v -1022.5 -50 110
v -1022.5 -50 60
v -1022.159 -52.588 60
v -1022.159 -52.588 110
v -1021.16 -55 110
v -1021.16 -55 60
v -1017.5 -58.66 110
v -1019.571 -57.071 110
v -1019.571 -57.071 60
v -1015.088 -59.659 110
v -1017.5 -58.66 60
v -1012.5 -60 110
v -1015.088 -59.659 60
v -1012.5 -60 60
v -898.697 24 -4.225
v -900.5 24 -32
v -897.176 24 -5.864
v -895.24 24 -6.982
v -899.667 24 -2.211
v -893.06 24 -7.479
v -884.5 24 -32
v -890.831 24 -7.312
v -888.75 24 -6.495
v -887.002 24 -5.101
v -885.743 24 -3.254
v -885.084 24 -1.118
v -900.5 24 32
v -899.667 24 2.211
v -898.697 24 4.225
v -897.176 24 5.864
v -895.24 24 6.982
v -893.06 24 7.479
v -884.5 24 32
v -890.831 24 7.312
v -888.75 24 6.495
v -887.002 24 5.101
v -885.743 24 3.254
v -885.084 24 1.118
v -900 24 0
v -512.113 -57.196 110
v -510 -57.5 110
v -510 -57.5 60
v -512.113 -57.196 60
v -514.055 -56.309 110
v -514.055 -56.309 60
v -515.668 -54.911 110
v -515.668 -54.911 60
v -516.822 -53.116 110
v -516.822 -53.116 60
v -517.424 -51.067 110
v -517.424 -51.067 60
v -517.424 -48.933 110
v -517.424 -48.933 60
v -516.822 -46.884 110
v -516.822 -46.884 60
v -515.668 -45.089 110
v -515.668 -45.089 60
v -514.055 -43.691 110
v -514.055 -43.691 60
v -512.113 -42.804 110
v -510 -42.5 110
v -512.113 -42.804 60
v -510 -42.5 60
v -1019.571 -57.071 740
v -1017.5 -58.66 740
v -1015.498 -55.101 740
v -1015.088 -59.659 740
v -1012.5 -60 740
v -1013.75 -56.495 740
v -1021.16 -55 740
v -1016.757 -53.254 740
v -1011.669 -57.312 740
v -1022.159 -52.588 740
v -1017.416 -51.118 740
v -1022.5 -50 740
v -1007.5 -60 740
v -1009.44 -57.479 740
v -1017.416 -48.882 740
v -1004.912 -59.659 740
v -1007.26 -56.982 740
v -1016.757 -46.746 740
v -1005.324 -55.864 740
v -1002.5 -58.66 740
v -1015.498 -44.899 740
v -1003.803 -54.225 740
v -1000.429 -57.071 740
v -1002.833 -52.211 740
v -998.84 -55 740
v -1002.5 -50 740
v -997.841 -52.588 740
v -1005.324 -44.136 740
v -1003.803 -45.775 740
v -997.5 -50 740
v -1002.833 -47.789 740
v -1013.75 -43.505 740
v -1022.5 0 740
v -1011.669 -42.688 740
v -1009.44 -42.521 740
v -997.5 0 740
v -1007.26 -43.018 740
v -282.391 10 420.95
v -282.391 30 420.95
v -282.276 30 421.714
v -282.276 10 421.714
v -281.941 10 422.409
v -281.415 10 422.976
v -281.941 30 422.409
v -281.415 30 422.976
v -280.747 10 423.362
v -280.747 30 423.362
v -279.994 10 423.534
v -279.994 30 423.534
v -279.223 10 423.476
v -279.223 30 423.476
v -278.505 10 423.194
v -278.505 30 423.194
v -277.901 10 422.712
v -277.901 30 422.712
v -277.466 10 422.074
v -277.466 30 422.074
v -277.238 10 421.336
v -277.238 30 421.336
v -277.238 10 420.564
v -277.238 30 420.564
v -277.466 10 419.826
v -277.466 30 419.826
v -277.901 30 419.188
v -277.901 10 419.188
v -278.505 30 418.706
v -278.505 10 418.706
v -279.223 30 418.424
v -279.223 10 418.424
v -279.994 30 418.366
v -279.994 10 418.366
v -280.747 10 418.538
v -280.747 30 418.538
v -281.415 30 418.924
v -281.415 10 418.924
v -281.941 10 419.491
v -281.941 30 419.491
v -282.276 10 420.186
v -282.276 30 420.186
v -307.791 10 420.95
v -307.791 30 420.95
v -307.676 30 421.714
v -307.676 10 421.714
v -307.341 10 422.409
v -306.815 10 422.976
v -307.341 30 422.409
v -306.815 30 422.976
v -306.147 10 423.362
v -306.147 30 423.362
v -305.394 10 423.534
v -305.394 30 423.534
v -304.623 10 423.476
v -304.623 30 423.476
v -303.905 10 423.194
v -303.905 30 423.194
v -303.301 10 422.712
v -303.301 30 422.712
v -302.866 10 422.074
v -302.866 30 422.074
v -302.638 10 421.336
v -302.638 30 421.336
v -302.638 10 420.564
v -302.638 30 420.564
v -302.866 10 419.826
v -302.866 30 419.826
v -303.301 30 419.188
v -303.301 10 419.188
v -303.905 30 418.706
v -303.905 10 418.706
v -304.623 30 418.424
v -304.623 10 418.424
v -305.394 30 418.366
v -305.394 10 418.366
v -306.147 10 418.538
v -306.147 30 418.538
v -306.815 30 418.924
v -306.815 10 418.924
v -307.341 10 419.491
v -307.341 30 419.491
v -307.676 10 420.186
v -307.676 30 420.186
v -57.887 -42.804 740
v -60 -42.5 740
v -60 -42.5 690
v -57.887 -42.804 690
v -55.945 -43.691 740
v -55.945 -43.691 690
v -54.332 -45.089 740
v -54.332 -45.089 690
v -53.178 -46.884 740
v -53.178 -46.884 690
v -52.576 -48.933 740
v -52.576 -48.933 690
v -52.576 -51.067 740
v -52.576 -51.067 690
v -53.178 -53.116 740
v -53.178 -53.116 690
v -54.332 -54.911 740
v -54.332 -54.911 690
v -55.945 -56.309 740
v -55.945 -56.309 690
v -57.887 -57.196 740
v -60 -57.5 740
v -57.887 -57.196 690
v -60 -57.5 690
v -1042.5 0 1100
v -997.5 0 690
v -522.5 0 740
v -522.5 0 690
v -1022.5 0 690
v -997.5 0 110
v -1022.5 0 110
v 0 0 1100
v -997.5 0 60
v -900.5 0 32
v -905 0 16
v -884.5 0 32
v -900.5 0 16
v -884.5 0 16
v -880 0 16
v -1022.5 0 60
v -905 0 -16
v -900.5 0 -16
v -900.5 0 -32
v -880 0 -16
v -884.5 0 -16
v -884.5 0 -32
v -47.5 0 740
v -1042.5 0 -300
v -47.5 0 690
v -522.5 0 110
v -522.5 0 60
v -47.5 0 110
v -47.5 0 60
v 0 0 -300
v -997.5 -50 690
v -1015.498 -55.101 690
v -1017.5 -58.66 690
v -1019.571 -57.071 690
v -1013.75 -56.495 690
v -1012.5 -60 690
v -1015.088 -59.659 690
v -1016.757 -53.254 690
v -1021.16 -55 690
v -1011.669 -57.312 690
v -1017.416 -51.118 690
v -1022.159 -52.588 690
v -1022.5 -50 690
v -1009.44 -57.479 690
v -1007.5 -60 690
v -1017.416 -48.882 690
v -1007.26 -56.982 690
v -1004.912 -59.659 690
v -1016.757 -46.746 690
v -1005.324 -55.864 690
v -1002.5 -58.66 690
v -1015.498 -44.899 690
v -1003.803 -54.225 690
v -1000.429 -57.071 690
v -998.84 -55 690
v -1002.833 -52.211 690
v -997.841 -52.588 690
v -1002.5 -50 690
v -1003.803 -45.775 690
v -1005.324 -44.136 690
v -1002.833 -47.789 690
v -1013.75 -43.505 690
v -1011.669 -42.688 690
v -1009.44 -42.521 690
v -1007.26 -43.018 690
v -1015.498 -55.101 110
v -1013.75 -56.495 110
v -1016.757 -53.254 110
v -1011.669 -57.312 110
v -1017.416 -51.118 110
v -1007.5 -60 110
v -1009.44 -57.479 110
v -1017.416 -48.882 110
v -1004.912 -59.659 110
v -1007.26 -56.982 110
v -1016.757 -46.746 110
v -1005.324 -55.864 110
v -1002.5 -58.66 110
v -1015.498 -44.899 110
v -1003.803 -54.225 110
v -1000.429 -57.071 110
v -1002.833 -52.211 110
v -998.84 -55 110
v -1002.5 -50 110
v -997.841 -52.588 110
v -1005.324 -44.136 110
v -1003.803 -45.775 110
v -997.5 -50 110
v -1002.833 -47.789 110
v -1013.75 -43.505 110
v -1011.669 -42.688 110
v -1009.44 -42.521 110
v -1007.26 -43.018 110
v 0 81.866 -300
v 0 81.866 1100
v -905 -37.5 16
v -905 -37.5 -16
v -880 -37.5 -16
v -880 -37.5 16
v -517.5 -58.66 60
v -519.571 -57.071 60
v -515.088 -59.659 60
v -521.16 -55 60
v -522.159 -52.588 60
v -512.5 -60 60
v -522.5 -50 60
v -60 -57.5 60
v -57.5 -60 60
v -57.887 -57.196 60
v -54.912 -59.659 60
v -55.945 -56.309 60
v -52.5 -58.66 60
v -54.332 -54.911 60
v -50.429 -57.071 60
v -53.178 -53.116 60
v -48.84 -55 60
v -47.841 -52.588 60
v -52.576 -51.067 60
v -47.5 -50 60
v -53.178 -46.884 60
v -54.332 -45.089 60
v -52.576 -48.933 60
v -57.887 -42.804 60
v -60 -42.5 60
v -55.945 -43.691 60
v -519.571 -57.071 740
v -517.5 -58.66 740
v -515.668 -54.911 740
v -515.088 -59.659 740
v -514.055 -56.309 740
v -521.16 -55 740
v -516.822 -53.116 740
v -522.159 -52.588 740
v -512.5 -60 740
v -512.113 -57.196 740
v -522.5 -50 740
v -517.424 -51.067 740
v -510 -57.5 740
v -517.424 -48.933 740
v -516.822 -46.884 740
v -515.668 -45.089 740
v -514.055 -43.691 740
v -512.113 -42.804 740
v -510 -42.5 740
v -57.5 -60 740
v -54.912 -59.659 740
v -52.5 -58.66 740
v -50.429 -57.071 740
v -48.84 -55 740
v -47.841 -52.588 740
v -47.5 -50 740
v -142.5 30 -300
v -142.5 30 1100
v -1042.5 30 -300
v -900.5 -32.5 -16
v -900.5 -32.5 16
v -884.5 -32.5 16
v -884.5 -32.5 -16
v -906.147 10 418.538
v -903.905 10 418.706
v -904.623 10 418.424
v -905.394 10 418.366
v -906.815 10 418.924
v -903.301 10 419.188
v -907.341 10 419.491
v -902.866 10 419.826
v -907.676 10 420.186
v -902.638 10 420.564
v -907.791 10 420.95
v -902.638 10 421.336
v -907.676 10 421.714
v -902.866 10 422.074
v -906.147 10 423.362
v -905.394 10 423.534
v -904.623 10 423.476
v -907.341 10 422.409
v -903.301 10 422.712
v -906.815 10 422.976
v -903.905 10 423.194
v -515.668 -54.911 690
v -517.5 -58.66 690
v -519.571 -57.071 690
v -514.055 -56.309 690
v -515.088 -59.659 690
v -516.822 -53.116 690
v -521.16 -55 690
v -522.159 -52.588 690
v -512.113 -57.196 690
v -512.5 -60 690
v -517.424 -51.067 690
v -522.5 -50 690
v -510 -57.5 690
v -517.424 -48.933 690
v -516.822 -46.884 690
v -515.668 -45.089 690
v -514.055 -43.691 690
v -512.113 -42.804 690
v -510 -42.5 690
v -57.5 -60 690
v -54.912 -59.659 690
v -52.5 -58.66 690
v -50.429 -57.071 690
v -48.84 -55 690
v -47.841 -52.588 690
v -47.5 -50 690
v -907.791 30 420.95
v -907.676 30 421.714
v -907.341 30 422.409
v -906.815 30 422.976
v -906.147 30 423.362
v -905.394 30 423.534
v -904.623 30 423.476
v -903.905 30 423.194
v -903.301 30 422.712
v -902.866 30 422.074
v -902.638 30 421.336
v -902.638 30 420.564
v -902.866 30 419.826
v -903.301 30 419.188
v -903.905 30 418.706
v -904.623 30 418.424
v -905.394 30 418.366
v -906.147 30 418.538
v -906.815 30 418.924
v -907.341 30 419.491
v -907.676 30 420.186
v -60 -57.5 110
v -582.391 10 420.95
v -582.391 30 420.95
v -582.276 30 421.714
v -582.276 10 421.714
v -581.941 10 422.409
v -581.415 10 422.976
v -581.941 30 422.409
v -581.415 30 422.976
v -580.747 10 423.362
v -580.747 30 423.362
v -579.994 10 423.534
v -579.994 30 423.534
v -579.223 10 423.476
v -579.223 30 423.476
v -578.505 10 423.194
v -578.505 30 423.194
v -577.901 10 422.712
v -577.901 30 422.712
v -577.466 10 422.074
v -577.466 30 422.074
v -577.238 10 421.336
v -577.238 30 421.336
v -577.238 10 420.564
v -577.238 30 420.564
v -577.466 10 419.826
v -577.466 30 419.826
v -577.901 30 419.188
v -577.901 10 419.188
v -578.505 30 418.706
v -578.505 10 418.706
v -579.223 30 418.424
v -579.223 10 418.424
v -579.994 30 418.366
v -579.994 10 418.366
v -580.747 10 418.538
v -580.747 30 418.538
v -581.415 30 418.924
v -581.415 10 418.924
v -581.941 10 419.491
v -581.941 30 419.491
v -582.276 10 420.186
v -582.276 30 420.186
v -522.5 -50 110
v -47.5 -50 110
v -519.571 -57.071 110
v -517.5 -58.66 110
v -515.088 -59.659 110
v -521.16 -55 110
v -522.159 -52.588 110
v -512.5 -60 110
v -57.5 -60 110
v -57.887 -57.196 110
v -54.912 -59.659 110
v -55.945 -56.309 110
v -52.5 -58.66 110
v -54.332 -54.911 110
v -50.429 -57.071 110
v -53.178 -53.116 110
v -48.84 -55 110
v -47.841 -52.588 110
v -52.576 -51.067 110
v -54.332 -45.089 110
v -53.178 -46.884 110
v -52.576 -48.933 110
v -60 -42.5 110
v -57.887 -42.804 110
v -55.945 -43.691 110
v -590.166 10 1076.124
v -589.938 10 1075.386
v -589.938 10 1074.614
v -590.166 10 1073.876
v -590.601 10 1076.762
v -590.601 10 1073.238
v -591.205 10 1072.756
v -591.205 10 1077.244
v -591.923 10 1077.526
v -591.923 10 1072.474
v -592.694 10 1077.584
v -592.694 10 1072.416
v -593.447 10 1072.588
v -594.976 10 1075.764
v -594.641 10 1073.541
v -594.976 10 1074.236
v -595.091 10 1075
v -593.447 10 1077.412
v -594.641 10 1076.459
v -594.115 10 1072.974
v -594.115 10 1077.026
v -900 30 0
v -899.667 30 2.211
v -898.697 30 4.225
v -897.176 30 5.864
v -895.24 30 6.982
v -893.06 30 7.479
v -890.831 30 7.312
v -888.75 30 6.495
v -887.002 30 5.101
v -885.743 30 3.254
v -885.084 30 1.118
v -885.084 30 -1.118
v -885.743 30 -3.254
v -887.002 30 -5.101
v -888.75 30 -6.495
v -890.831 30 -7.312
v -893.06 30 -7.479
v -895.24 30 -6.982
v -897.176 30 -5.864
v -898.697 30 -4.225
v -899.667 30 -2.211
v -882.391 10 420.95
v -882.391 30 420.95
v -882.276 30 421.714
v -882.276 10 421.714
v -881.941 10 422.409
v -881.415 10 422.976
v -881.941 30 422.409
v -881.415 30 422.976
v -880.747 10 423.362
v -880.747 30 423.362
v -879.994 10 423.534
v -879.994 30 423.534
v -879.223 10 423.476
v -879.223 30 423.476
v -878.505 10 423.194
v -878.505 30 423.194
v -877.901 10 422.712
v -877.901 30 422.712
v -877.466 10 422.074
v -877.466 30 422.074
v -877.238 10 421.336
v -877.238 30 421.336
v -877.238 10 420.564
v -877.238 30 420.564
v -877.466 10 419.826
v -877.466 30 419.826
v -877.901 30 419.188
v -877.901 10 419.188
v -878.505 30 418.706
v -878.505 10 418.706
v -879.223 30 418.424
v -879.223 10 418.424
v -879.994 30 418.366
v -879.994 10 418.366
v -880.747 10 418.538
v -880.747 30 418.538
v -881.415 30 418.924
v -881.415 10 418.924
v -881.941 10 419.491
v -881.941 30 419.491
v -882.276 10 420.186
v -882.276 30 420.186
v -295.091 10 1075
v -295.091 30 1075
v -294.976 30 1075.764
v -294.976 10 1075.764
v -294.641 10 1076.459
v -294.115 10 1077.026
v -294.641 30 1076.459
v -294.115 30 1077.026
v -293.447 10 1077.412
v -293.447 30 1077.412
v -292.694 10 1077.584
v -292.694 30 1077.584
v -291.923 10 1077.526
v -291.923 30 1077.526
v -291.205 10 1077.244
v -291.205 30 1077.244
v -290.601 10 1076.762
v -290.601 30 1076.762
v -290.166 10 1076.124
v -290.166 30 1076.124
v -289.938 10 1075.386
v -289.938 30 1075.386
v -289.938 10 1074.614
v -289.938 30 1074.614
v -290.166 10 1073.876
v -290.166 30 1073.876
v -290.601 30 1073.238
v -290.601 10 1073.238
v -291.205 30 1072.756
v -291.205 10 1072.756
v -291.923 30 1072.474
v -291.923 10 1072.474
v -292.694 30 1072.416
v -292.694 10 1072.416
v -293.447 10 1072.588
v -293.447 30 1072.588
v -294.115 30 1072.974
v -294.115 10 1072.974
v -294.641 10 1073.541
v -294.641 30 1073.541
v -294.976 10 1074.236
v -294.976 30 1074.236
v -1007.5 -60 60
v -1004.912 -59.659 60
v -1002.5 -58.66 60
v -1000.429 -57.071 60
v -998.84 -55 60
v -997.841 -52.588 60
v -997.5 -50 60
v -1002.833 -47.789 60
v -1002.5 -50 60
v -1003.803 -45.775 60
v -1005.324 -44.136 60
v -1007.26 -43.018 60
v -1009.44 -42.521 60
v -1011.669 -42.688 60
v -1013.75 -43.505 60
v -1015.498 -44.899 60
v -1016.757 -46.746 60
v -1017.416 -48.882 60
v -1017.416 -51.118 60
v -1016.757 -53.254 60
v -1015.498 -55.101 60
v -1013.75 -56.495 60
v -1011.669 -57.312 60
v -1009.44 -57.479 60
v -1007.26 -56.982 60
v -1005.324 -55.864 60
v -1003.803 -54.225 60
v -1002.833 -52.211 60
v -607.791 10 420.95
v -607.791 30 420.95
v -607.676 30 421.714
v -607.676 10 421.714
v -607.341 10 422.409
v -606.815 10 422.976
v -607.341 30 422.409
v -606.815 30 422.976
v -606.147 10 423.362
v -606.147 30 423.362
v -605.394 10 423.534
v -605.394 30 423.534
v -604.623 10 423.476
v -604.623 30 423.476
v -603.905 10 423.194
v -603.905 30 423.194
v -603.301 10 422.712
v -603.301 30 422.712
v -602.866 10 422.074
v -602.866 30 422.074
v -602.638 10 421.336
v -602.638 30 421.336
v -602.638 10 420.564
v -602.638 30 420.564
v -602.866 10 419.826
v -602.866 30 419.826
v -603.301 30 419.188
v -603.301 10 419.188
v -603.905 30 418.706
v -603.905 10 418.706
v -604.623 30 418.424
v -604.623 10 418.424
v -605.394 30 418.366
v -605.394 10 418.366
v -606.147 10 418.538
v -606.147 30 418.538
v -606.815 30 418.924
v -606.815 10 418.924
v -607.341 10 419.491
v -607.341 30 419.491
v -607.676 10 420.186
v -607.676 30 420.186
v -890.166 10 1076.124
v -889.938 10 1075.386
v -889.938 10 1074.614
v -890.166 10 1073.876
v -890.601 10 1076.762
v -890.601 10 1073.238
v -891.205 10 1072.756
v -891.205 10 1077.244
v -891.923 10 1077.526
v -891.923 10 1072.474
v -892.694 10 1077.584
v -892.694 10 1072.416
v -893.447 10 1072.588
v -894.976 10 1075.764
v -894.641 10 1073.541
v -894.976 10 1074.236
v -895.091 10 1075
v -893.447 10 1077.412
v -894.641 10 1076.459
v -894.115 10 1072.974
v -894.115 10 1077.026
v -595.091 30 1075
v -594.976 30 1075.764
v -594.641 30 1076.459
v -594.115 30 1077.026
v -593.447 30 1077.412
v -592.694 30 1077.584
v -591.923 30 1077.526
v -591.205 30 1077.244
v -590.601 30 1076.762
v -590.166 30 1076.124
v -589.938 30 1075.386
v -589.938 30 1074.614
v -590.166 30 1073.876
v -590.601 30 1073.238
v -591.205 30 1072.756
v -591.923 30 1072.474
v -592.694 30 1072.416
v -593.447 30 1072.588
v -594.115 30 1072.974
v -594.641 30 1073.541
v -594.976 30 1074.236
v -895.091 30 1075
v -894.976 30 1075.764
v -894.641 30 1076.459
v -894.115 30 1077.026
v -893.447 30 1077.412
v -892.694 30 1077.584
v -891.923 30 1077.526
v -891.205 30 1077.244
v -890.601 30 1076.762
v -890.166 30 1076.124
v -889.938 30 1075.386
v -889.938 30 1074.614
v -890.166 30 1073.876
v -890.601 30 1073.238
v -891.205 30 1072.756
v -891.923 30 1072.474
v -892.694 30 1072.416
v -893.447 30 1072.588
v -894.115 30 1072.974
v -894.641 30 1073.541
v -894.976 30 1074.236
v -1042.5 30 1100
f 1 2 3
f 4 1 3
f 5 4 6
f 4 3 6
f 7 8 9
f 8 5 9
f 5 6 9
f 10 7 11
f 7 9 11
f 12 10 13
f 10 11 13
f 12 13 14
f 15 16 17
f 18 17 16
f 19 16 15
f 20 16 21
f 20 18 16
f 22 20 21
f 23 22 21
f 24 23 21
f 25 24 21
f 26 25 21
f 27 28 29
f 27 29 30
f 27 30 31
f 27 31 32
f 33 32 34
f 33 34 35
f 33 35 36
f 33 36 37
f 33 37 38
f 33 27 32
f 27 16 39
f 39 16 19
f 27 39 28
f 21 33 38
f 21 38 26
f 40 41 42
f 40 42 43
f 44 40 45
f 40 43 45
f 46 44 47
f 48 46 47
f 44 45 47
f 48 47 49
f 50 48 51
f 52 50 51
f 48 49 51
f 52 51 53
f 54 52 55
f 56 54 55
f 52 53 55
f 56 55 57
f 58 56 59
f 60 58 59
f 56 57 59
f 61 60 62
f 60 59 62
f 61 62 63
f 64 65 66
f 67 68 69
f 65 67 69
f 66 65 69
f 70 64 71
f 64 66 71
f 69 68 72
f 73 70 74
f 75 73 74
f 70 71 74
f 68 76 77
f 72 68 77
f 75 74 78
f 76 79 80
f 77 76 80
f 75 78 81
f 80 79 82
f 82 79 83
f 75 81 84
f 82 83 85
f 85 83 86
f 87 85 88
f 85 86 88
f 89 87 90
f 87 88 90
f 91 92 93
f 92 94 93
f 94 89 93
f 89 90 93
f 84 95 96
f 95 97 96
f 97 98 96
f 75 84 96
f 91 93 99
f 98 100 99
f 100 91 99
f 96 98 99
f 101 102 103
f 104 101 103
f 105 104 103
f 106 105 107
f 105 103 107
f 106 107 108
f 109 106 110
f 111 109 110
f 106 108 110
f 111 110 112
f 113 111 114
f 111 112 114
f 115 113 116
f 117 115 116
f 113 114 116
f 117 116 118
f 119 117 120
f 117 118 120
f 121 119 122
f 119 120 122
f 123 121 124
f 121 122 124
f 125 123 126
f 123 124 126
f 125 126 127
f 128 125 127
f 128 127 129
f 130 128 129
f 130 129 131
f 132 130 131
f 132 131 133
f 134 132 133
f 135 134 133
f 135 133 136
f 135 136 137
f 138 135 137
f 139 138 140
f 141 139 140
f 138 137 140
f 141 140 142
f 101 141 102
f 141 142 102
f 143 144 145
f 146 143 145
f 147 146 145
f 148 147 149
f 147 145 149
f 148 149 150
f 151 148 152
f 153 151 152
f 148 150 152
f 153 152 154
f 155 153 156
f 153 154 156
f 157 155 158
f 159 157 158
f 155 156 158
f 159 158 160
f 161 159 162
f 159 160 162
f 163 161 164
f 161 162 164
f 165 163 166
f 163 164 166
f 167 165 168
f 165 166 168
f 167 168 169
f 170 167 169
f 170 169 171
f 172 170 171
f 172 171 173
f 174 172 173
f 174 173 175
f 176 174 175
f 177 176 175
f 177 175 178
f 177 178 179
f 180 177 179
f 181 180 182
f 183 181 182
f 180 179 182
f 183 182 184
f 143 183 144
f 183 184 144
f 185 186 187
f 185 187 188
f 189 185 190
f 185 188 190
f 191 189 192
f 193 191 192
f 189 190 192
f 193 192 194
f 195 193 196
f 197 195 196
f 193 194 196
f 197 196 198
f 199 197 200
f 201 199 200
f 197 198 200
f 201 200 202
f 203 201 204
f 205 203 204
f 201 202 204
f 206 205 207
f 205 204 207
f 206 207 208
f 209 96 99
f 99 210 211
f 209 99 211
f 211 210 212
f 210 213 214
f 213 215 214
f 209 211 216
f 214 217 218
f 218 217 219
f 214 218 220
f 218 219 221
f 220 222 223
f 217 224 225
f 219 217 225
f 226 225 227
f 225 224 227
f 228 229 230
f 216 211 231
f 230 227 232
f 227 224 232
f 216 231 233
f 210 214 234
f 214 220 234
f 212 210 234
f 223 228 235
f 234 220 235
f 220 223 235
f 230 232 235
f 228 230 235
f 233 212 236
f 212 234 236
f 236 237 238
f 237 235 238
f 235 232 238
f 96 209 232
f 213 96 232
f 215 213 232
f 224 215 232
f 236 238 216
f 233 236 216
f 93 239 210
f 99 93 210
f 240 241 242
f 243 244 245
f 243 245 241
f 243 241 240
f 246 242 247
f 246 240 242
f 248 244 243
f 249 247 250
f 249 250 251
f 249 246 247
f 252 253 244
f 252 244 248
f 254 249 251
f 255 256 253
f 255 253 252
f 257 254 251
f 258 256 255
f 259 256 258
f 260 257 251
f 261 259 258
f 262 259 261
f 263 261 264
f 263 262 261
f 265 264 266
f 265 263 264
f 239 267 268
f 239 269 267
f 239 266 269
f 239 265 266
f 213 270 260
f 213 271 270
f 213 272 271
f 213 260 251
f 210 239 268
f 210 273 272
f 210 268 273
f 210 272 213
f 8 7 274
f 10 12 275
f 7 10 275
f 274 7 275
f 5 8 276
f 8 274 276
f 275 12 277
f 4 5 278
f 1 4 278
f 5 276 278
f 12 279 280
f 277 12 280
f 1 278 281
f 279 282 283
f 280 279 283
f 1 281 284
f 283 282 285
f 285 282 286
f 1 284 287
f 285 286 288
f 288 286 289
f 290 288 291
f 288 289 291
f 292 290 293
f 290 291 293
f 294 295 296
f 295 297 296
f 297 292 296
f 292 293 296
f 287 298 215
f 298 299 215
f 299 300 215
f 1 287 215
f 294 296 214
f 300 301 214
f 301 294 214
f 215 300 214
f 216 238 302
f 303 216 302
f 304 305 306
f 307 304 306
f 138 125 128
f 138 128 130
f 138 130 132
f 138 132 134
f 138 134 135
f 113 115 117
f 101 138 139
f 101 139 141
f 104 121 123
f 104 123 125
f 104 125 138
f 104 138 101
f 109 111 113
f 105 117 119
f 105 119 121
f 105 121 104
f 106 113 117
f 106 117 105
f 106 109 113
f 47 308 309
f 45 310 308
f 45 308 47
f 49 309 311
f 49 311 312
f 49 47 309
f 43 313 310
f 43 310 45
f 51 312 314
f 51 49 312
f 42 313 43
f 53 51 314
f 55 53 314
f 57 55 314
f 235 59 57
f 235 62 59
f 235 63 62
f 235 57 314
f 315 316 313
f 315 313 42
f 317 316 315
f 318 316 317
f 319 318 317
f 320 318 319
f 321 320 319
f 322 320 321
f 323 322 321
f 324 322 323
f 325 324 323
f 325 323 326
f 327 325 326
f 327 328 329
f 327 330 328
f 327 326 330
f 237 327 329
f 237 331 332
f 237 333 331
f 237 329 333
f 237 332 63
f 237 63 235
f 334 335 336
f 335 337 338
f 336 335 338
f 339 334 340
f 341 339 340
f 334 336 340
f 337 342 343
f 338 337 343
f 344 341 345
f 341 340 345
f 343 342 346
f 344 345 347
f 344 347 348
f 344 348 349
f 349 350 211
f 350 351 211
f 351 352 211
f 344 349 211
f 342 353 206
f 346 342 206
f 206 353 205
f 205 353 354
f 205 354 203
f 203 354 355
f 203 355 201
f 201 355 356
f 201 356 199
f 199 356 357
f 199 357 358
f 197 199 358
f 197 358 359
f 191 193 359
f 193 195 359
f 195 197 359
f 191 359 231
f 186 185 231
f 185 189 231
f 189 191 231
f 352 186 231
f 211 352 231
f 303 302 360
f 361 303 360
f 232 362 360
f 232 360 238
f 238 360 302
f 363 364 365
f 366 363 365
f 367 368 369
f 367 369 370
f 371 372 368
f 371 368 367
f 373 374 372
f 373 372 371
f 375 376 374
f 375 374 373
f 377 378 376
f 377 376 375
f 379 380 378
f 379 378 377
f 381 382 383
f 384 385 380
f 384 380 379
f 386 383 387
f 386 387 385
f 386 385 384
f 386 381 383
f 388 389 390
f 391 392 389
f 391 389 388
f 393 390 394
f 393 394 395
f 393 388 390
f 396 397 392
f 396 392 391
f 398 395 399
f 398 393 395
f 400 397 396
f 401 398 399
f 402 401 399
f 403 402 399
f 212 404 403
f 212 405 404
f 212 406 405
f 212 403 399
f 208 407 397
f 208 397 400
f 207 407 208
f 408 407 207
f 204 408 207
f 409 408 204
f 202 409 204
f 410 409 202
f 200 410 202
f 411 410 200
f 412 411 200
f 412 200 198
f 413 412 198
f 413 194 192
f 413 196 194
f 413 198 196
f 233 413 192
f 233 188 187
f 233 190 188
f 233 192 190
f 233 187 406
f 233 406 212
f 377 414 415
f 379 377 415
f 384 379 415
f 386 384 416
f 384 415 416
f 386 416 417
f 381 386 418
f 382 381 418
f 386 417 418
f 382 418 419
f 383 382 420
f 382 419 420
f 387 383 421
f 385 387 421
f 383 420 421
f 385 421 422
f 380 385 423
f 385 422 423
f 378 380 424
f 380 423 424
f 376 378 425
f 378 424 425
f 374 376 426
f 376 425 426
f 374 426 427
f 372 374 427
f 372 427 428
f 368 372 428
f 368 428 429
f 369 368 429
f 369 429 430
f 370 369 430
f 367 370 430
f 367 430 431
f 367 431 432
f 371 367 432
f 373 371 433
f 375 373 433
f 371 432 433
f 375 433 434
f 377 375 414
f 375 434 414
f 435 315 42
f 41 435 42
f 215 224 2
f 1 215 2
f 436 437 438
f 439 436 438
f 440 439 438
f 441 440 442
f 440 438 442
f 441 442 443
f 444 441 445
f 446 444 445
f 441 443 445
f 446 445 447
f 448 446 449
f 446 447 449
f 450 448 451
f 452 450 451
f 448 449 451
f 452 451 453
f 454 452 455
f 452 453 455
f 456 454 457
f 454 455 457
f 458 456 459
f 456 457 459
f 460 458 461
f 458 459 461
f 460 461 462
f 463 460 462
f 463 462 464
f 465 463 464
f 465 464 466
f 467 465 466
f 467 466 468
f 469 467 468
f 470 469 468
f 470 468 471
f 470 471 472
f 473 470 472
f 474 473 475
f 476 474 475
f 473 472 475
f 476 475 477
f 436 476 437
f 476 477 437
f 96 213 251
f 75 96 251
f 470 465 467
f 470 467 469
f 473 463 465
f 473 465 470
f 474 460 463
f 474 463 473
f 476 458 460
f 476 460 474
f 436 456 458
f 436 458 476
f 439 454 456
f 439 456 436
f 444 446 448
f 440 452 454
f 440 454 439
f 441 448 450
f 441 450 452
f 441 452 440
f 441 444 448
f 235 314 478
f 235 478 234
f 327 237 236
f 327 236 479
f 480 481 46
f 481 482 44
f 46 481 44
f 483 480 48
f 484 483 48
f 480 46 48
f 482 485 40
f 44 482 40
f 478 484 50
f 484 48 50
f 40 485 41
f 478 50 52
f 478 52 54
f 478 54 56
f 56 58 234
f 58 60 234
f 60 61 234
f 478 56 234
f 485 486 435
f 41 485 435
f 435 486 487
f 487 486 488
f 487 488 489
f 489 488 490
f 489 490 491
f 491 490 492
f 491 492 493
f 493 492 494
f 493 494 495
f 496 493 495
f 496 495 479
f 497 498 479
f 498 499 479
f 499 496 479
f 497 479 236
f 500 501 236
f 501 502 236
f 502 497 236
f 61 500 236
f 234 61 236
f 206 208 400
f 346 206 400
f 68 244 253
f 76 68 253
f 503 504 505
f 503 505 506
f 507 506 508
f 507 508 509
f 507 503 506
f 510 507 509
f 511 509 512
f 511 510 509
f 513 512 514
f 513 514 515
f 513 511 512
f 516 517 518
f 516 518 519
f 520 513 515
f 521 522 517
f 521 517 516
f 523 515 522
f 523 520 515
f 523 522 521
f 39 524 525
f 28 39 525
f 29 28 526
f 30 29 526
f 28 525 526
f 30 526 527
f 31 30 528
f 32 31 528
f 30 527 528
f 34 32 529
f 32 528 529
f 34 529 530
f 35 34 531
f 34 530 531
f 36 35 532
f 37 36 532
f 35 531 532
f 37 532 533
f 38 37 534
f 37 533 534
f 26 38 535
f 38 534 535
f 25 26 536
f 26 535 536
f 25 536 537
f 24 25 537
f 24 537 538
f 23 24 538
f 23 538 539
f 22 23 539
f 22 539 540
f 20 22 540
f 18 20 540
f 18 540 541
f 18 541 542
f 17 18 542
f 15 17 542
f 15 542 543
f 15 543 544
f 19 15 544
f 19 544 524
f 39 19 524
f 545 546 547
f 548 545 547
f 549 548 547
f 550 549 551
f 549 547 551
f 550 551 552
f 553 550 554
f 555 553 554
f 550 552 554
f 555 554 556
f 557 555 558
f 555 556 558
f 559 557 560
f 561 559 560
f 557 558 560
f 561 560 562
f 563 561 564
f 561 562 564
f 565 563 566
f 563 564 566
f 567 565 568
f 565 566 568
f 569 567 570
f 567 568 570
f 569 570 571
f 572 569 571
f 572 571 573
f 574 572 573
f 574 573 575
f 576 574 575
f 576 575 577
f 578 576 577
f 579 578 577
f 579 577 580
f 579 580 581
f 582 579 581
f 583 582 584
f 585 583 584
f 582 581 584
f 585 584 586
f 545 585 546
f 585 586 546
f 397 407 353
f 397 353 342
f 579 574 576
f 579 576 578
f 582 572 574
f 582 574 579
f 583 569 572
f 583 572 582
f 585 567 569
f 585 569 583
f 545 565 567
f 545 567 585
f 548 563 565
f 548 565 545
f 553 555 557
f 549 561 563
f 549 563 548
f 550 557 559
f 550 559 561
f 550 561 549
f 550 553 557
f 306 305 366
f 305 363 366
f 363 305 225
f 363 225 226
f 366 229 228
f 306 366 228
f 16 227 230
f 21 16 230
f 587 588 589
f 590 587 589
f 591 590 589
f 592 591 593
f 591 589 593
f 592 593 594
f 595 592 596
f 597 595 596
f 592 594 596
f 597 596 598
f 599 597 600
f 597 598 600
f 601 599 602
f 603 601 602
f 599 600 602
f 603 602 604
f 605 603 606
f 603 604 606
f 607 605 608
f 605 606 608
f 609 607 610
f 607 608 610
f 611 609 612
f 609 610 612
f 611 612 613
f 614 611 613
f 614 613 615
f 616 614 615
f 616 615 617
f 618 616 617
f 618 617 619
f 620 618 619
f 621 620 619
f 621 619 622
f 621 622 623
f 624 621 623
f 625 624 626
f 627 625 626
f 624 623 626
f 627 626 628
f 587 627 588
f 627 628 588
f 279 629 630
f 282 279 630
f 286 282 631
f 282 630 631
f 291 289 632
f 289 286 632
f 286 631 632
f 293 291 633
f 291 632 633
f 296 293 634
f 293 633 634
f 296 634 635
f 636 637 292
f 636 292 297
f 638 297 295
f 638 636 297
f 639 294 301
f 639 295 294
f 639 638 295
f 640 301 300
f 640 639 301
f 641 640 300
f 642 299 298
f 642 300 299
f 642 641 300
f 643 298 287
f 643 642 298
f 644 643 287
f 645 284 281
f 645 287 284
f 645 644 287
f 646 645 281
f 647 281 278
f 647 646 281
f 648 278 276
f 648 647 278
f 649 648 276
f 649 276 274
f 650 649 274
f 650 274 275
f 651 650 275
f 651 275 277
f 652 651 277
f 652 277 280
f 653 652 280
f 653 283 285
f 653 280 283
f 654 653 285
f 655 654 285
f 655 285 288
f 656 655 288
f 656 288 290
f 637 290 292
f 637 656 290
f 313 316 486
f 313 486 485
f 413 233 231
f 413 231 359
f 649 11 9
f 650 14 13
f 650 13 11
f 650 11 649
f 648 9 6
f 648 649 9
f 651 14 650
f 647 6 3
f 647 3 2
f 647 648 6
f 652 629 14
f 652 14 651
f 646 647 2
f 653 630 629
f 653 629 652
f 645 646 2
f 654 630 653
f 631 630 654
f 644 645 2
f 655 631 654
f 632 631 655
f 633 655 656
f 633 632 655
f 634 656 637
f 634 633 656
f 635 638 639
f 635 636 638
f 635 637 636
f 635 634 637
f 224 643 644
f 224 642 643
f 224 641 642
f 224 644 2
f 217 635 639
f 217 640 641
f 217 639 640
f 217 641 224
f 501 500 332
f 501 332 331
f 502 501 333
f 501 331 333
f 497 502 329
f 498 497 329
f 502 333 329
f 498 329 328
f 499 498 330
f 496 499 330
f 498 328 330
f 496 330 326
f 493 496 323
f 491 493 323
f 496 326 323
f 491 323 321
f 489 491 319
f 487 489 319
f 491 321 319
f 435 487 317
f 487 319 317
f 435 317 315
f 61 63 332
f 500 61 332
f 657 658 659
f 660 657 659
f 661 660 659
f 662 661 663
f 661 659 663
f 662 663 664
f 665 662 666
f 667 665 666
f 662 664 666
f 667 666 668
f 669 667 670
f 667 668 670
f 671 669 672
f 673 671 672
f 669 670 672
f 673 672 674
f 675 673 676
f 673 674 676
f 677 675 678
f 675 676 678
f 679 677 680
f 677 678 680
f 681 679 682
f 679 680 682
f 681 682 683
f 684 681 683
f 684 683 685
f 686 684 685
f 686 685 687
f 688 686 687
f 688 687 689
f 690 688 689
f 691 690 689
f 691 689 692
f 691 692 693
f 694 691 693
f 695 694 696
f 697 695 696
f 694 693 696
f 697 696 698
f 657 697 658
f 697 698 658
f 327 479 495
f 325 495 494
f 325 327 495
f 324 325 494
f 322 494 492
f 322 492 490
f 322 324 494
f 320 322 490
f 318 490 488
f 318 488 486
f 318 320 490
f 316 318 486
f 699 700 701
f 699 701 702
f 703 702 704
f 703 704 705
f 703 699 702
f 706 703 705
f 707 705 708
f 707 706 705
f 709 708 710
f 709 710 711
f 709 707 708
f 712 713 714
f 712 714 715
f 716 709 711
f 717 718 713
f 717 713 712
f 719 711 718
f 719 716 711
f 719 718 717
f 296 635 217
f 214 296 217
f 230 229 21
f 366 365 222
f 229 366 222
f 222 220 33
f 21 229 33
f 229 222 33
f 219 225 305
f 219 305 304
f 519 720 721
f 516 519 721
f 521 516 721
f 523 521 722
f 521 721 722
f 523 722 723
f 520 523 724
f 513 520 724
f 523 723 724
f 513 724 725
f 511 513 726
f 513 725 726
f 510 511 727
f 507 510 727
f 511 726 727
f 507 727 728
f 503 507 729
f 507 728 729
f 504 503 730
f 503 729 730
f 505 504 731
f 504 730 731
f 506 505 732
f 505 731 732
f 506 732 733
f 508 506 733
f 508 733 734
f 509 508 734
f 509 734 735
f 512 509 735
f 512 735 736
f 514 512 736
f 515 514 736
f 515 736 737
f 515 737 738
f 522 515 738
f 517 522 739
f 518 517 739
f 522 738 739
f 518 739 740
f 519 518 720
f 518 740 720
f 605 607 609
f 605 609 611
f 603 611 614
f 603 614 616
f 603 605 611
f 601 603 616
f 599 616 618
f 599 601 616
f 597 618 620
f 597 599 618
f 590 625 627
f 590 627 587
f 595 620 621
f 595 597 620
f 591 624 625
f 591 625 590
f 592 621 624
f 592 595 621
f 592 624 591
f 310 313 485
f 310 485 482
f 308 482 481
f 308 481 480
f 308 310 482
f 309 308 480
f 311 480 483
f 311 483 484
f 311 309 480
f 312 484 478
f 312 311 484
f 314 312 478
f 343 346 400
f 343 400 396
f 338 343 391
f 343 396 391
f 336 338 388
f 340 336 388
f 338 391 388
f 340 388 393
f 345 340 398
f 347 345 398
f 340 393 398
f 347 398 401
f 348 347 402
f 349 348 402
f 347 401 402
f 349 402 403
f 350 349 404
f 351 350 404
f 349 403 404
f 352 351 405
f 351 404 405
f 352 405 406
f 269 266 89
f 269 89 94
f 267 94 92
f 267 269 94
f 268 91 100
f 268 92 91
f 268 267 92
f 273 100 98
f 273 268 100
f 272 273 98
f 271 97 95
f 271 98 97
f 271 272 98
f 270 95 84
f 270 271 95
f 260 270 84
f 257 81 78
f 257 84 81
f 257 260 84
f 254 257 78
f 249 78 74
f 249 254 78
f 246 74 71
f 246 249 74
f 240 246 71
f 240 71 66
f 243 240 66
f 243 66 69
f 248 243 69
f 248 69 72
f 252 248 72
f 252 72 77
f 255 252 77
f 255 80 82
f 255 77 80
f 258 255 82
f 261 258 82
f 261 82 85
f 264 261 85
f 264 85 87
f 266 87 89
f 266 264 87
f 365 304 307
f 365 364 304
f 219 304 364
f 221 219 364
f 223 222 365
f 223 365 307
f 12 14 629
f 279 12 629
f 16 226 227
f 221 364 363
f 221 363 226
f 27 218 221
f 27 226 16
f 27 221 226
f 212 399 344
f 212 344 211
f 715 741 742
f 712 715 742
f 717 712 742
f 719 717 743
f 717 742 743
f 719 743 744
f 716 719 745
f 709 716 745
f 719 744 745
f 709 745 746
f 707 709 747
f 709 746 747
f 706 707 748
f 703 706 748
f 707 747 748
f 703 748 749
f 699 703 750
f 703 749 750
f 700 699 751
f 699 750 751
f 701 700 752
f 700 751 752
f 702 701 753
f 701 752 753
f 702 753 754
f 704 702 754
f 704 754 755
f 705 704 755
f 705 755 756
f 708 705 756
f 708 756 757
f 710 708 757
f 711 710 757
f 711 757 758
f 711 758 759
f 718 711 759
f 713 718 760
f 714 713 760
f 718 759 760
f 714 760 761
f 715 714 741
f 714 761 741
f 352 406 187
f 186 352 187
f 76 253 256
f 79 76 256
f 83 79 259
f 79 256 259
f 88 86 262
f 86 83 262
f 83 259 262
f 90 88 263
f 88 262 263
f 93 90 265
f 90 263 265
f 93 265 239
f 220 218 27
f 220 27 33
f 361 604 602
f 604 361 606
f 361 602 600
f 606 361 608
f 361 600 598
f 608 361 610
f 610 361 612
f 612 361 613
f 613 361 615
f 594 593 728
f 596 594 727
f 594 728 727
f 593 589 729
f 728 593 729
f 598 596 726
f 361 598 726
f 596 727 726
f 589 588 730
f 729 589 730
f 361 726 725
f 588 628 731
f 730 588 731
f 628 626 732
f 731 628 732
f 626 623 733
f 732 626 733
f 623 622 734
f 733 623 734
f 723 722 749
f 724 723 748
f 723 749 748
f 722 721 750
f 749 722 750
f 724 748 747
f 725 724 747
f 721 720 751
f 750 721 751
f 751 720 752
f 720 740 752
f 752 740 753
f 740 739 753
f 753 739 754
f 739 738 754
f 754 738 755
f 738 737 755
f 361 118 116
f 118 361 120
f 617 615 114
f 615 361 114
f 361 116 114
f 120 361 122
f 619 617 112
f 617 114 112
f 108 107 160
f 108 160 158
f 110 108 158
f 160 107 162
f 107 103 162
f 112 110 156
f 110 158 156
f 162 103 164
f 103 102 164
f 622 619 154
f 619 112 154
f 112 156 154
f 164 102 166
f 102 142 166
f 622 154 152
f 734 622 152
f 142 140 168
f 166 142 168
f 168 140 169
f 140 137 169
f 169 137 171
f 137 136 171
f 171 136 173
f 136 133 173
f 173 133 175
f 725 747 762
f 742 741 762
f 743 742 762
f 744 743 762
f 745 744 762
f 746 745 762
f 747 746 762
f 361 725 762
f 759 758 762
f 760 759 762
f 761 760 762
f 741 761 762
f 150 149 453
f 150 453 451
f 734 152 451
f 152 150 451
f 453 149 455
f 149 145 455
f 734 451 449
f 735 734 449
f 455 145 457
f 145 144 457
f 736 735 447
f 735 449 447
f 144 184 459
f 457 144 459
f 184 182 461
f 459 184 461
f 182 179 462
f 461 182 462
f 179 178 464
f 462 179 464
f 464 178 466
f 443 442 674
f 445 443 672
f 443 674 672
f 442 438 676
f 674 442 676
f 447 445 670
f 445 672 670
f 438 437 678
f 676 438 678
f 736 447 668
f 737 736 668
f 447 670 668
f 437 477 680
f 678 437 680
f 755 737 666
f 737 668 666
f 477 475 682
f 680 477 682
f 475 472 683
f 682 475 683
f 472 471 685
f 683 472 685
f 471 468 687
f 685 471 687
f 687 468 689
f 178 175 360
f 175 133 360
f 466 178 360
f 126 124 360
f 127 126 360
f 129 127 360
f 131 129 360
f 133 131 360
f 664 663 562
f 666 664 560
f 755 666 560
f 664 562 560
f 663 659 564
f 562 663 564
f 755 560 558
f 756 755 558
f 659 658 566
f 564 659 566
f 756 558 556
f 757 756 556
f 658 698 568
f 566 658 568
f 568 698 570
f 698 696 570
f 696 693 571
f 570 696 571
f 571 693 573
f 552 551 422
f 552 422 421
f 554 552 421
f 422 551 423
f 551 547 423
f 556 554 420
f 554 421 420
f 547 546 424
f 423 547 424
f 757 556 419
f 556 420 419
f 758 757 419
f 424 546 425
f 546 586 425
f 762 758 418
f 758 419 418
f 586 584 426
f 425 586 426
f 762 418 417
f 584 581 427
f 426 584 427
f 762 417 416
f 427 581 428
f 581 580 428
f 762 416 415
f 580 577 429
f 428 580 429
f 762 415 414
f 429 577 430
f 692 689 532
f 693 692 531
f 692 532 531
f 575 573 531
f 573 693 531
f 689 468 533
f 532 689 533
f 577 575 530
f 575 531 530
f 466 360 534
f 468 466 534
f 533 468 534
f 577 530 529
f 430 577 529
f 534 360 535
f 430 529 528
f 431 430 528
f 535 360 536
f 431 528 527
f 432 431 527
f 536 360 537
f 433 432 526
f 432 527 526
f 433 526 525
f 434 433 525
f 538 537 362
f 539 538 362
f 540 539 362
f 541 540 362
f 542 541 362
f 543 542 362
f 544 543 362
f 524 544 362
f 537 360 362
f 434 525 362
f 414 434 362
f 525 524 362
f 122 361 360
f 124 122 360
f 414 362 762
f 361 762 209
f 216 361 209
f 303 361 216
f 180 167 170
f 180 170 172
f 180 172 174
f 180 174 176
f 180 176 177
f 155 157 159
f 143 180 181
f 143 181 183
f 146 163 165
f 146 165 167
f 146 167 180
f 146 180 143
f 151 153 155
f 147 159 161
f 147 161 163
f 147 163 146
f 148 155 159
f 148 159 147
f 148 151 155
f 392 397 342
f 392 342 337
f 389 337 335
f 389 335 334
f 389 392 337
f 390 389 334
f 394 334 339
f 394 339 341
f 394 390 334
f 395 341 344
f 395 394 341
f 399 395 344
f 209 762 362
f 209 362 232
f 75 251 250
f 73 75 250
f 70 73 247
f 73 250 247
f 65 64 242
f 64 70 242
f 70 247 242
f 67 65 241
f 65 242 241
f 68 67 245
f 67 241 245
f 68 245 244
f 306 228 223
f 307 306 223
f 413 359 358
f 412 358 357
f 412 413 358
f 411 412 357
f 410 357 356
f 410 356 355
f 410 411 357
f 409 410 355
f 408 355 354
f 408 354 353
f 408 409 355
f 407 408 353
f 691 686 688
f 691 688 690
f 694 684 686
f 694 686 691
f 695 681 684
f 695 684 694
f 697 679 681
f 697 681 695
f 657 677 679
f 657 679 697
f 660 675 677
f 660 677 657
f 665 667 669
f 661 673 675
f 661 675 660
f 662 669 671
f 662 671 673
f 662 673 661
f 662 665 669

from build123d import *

# Parameters (mm, degrees)
BOSS_EXTRUDE1_DEPTH      = 1100
BOSS_EXTRUDE1_DEPTH_BACK = 300
SKETCH3_R                = 7.5
BOSS_EXTRUDE2_DEPTH      = 800
SKETCH5_R                = 7.5
CUT_EXTRUDE2_DEPTH       = 1519.191769837
SKETCH9_W                = 580
SKETCH9_H                = 60
SKETCH9_W_2              = 60
CUT_EXTRUDE5_DEPTH       = 1486.505638628
SKETCH6_W                = 25
SKETCH6_H                = 32
BOSS_EXTRUDE3_DEPTH      = 37.5
SKETCH7_W                = 16
SKETCH7_H                = 32.5
CUT_EXTRUDE3_DEPTH       = 1507.17537239
SKETCH8_W                = 16
SKETCH8_H                = 64
CUT_EXTRUDE4_DEPTH       = 24
SKETCH10_R               = 2.5908
CUT_EXTRUDE6_DEPTH       = 20


with BuildPart() as part:
    # Sketch2 → Boss-Extrude1 (new, two sides: drawn at the far end of the back side and taken through both)
    with BuildSketch(Plane.XY.offset(-BOSS_EXTRUDE1_DEPTH_BACK)):
        Polygon((0, 0), (0, 81.865758383), (-142.5, 30), (-1042.5, 30), (-1042.5, 0), align=None)
    extrude(amount=BOSS_EXTRUDE1_DEPTH + BOSS_EXTRUDE1_DEPTH_BACK)

    # Sketch3 → Boss-Extrude2 (add)
    # profile 1 of 2: a face of its own
    with BuildSketch(Plane.XY):
        with BuildLine():
            Line((-47.5, 0), (-47.5, -50))
            ThreePointArc((-47.5, -50), (-50.428932188, -57.071067812), (-57.5, -60))
            Line((-57.5, -60), (-512.5, -60))
            ThreePointArc((-512.5, -60), (-519.571067812, -57.071067812), (-522.5, -50))
            Line((-522.5, -50), (-522.5, 0))
            Line((-522.5, 0), (-47.5, 0))
        make_face()
        with BuildLine():
            Line((-510, -42.5), (-60, -42.5))
            ThreePointArc((-60, -42.5), (-52.5, -50), (-60, -57.5))
            Line((-60, -57.5), (-510, -57.5))
            ThreePointArc((-510, -57.5), (-517.5, -50), (-510, -42.5))
        make_face(mode=Mode.SUBTRACT)
    # profile 2 of 2: a face of its own
    with BuildSketch(Plane.XY):
        with BuildLine():
            Line((-1022.5, 0), (-1022.5, -50))
            ThreePointArc((-1022.5, -50), (-1019.571067812, -57.071067812), (-1012.5, -60))
            Line((-1012.5, -60), (-1007.5, -60))
            ThreePointArc((-1007.5, -60), (-1000.428932188, -57.071067812), (-997.5, -50))
            Line((-997.5, -50), (-997.5, 0))
            Line((-997.5, 0), (-1022.5, 0))
        make_face()
        with Locations((-1010, -50)):
            Circle(SKETCH3_R, mode=Mode.SUBTRACT)
    extrude(amount=BOSS_EXTRUDE2_DEPTH)

    # Sketch5 → Cut-Extrude2 (cut, through all)
    with BuildSketch(Plane(origin=(0, 30, 0), x_dir=(1, 0, 0), z_dir=(0, 1, 0))):
        with Locations(Location((-892.5, 0, 0), (0, 0, 180))):
            Circle(SKETCH5_R)
    extrude(amount=-CUT_EXTRUDE2_DEPTH, mode=Mode.SUBTRACT)

    # Sketch9 → Cut-Extrude5 (cut, through all)
    with BuildSketch(Plane(origin=(-47.5, 0, 0), x_dir=(0, 0, -1), z_dir=(1, 0, 0))):
        with Locations((-400, -30)):
            Rectangle(SKETCH9_W, SKETCH9_H)
        Polygon((-740, -50), (-740, -60), (-800, -60), (-800, -50), (-800, 0), (-740, 0), align=None)
        with Locations((-30, -30)):
            Rectangle(SKETCH9_W_2, SKETCH9_H)
    extrude(amount=-CUT_EXTRUDE5_DEPTH, mode=Mode.SUBTRACT)

    # Sketch6 → Boss-Extrude3 (add)
    with BuildSketch(Plane.XZ):
        with Locations((-892.5, 0)):
            Rectangle(SKETCH6_W, SKETCH6_H)
    extrude(amount=BOSS_EXTRUDE3_DEPTH)

    # Sketch7 → Cut-Extrude3 (cut, through all)
    with BuildSketch(Plane.XY.offset(16)):
        with Locations((-892.5, -16.25)):
            Rectangle(SKETCH7_W, SKETCH7_H)
    extrude(amount=-CUT_EXTRUDE3_DEPTH, mode=Mode.SUBTRACT)

    # Sketch8 → Cut-Extrude4 (cut)
    with BuildSketch(Plane.XZ):
        with Locations((-892.5, 0)):
            Rectangle(SKETCH8_W, SKETCH8_H)
    extrude(amount=-CUT_EXTRUDE4_DEPTH, mode=Mode.SUBTRACT)

    # Sketch10 → Cut-Extrude6 (cut)
    with BuildSketch(Plane(origin=(0, 30, 0), x_dir=(1, 0, 0), z_dir=(0, 1, 0))):
        with Locations(Location((-892.5, -1075, 0), (0, 0, 180))):
            Circle(SKETCH10_R)
        with Locations(Location((-592.5, -1075, 0), (0, 0, 180))):
            Circle(SKETCH10_R)
        with Locations(Location((-292.5, -1075, 0), (0, 0, 180))):
            Circle(SKETCH10_R)
        with Locations(Location((-905.2, -420.95, 0), (0, 0, 180))):
            Circle(SKETCH10_R)
        with Locations(Location((-879.8, -420.95, 0), (0, 0, 180))):
            Circle(SKETCH10_R)
        with Locations(Location((-605.2, -420.95, 0), (0, 0, 180))):
            Circle(SKETCH10_R)
        with Locations(Location((-579.8, -420.95, 0), (0, 0, 180))):
            Circle(SKETCH10_R)
        with Locations(Location((-305.2, -420.95, 0), (0, 0, 180))):
            Circle(SKETCH10_R)
        with Locations(Location((-279.8, -420.95, 0), (0, 0, 180))):
            Circle(SKETCH10_R)
    extrude(amount=-CUT_EXTRUDE6_DEPTH, mode=Mode.SUBTRACT)


solid = part.part
